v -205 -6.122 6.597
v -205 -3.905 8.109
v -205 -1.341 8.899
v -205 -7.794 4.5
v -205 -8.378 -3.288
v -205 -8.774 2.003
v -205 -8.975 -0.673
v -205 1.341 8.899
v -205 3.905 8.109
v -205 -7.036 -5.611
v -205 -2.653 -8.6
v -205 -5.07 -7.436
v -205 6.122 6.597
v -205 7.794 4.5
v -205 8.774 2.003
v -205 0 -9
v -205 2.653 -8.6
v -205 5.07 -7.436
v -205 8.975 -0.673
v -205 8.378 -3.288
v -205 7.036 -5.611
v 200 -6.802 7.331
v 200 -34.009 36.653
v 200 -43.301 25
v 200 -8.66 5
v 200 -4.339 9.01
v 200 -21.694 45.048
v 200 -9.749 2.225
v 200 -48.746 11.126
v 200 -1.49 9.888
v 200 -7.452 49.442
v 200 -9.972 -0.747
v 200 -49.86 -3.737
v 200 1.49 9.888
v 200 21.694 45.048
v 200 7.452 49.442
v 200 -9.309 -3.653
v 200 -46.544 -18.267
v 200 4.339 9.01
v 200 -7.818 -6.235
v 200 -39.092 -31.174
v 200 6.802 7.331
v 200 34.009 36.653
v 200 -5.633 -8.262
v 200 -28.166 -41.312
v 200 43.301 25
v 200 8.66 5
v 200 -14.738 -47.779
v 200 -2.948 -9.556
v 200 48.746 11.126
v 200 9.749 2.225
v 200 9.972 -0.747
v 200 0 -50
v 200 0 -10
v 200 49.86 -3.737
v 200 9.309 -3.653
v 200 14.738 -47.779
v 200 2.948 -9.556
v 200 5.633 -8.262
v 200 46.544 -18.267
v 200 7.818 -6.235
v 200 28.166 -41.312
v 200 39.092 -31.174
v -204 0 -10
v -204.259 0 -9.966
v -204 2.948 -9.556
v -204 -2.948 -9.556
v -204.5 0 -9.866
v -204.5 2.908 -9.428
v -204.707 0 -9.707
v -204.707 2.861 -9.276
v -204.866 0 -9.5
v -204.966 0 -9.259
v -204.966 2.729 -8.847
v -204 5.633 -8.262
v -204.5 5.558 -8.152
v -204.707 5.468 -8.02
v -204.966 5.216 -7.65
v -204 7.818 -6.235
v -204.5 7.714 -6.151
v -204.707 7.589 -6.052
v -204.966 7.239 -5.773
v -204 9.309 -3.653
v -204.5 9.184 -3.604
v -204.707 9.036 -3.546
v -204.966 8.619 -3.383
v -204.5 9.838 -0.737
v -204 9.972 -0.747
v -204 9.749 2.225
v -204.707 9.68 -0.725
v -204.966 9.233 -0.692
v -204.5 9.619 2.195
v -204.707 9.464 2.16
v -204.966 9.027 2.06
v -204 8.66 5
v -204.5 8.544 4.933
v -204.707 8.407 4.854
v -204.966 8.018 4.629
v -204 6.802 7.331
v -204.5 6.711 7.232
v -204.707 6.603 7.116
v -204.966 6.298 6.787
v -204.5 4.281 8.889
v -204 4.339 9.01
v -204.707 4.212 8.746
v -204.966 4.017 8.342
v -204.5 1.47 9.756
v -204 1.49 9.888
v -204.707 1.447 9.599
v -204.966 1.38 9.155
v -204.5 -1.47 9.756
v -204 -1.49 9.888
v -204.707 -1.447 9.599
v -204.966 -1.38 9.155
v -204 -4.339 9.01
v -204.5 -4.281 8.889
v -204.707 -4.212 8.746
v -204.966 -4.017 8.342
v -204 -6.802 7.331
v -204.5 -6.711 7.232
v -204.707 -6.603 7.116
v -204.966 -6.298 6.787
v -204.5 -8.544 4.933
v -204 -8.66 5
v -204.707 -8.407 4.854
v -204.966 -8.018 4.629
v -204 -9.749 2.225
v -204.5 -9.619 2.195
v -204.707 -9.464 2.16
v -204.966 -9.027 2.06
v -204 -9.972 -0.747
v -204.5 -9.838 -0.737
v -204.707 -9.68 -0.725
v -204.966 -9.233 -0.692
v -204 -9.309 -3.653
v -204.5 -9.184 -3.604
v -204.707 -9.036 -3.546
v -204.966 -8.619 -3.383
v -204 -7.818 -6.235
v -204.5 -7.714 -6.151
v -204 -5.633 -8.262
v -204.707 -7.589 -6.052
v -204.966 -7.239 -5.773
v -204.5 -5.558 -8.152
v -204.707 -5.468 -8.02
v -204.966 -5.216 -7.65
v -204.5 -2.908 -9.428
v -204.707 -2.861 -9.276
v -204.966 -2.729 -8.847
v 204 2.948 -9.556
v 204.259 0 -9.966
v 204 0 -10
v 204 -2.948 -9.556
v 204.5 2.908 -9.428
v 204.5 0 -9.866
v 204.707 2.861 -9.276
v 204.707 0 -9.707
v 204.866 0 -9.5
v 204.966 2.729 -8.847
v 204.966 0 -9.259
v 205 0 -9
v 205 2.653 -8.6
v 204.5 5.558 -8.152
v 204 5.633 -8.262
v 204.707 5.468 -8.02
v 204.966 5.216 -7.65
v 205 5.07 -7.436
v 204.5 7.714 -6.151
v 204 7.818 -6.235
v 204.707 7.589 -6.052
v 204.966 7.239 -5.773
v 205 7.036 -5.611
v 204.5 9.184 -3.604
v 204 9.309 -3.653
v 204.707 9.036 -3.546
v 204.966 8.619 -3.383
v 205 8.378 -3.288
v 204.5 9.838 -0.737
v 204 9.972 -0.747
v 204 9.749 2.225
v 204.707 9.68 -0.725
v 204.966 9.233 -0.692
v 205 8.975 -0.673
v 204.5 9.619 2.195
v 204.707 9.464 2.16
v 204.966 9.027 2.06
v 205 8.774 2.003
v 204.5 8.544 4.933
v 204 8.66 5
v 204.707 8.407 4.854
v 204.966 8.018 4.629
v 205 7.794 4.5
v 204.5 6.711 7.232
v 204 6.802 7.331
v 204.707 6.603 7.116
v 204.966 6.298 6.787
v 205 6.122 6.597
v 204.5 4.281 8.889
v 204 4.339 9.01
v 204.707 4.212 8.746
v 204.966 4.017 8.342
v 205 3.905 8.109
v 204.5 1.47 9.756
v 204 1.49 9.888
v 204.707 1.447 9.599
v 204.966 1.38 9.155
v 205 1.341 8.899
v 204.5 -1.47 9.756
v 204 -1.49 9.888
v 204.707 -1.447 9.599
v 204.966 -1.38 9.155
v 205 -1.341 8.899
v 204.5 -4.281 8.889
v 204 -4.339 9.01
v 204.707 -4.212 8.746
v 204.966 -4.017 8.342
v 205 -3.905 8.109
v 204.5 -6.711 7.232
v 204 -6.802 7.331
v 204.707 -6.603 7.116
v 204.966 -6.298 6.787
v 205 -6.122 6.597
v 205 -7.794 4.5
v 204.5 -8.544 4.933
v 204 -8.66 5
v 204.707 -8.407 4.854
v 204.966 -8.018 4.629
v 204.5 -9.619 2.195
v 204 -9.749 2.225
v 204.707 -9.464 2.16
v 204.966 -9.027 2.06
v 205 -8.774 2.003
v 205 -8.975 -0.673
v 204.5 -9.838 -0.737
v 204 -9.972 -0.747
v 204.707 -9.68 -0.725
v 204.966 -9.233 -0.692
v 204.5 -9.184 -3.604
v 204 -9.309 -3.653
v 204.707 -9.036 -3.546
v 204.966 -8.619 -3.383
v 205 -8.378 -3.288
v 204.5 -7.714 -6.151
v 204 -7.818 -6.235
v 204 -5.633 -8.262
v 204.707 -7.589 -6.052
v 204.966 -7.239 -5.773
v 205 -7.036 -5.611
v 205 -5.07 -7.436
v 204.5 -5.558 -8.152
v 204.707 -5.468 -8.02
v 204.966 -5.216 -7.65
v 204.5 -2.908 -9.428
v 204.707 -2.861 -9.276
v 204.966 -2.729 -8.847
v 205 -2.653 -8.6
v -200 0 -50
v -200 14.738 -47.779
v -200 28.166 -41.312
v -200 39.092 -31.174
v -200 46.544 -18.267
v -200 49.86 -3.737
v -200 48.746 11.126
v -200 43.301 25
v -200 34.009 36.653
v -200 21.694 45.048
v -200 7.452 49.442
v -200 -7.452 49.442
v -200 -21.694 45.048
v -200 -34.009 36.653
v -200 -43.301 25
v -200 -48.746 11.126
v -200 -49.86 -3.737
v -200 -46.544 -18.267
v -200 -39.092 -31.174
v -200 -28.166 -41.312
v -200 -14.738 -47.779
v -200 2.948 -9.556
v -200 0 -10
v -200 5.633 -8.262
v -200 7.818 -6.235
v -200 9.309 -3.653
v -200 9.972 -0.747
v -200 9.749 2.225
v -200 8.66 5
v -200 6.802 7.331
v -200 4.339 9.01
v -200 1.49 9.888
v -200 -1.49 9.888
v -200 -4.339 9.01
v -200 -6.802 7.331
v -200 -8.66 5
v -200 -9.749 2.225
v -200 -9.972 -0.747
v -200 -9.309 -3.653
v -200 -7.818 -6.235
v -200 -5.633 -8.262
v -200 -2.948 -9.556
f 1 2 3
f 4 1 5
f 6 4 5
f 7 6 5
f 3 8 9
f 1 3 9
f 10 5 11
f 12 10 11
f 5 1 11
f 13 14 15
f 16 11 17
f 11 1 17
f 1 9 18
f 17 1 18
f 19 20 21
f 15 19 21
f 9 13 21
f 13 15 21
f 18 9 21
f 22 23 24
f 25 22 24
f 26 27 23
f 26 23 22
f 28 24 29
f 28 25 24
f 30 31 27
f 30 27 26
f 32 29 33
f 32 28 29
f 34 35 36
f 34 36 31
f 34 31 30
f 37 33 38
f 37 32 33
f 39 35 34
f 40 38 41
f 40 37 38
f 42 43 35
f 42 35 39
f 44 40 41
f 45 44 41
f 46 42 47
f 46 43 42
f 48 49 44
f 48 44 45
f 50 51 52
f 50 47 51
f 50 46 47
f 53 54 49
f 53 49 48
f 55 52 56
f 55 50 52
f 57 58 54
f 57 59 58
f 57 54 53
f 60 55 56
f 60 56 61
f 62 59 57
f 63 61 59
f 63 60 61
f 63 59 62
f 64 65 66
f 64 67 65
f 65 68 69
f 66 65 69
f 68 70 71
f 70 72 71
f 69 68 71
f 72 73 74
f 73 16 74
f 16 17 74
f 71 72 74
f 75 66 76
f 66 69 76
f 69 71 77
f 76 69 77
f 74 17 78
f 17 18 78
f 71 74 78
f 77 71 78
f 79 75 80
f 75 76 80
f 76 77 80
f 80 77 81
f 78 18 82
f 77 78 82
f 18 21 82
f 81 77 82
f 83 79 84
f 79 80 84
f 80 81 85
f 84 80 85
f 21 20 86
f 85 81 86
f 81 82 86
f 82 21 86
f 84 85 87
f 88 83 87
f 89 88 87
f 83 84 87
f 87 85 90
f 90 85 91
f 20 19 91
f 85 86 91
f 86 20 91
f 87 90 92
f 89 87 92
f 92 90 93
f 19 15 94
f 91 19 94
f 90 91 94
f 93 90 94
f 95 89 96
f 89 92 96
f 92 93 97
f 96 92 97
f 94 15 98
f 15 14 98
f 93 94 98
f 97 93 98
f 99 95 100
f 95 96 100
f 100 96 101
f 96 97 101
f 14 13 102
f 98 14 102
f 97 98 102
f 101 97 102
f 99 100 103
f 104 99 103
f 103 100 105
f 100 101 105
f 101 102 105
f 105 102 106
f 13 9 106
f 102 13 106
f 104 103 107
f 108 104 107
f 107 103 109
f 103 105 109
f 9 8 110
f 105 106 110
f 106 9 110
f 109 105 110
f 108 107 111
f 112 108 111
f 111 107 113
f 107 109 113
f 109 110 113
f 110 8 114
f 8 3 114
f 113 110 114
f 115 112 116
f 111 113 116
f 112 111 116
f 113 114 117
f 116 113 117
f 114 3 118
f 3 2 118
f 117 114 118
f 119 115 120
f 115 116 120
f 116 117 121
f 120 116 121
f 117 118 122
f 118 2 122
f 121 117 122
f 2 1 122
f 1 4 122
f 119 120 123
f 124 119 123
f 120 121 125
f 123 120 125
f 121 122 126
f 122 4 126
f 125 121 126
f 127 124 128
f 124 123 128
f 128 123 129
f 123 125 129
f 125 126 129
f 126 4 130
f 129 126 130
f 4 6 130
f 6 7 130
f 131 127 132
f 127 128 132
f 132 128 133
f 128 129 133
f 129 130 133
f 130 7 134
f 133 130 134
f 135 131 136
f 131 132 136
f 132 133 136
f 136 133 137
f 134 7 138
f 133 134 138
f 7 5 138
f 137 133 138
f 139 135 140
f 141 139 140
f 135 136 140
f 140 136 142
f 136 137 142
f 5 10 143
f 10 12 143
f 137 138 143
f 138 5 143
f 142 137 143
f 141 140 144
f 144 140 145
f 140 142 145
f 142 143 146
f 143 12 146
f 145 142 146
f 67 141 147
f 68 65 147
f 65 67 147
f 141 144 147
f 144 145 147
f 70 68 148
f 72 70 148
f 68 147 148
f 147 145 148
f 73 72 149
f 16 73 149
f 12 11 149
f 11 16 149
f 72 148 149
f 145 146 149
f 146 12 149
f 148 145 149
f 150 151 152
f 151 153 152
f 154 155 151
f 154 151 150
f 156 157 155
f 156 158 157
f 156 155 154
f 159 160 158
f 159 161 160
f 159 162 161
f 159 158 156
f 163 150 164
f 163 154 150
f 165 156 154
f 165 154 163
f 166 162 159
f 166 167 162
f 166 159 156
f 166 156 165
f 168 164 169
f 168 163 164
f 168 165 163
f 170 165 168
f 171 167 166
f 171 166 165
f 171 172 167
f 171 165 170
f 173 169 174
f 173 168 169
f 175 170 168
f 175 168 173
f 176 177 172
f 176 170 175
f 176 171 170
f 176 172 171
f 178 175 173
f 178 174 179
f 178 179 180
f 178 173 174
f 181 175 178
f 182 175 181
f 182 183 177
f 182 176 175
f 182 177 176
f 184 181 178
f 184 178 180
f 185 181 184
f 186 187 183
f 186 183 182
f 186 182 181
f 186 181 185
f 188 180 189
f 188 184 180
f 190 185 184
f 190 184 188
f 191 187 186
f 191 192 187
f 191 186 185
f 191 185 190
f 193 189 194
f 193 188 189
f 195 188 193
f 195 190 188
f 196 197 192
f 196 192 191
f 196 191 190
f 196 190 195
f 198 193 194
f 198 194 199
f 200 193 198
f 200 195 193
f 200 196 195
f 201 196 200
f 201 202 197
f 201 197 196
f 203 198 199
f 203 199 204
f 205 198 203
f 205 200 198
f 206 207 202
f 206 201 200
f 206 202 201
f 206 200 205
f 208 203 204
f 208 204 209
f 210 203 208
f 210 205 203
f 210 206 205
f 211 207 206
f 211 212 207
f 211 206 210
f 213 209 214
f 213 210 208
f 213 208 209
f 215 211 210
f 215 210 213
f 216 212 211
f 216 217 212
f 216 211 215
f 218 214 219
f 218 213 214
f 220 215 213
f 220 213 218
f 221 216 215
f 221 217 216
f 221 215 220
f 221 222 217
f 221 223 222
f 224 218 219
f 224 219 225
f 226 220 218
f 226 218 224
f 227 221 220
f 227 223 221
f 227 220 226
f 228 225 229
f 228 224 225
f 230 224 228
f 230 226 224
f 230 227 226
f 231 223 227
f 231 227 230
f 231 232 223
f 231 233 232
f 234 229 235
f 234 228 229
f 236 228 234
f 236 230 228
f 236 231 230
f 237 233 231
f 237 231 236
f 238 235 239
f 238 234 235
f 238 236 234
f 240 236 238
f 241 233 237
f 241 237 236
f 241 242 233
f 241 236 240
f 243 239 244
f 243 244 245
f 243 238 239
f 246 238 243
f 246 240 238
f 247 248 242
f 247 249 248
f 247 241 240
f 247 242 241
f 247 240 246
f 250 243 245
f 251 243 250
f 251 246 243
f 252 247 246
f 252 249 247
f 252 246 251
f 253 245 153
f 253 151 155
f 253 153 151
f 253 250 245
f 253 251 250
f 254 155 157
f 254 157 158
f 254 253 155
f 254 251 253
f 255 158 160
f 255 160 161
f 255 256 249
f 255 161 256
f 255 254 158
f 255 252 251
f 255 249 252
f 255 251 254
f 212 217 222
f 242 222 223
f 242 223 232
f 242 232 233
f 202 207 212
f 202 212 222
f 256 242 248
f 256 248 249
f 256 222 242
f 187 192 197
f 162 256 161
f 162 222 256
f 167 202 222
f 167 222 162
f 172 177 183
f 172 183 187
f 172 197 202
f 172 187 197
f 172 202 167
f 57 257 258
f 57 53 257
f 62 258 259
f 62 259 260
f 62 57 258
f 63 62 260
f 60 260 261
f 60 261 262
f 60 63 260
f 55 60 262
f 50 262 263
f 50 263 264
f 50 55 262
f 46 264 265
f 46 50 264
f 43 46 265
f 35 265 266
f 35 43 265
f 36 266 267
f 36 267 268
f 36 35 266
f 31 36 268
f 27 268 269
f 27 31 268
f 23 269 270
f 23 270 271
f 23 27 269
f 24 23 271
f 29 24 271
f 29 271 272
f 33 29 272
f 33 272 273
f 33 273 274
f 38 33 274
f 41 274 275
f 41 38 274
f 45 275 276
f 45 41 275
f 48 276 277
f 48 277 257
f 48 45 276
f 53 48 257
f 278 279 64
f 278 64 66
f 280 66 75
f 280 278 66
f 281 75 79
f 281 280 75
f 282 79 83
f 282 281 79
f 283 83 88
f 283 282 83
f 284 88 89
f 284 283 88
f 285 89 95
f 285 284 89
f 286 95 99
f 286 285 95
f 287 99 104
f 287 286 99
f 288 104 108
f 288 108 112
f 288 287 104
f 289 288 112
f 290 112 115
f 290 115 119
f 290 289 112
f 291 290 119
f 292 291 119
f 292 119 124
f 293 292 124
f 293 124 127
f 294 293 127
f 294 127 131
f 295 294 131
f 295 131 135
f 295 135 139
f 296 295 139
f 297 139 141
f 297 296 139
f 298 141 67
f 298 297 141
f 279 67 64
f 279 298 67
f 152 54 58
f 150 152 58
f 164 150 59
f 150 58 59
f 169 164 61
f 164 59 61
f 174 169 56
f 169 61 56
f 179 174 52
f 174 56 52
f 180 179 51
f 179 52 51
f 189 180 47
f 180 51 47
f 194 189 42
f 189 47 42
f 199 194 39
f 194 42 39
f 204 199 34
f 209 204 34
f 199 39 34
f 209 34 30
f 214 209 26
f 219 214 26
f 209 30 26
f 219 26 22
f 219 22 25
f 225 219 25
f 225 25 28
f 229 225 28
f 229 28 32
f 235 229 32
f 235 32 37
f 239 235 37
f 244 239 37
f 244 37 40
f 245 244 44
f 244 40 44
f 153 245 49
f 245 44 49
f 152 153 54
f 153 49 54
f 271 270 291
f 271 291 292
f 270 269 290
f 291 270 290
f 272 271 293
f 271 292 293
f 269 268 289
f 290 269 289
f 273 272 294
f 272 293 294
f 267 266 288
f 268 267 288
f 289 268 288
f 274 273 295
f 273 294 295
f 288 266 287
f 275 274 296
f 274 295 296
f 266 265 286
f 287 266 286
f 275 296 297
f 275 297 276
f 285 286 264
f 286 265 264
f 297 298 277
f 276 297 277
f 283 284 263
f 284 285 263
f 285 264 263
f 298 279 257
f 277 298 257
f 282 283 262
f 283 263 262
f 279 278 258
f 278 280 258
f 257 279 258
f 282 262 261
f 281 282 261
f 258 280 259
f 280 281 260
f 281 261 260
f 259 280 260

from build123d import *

# Parameters (mm, degrees)
SKETCH1_R            = 50
BOSS_EXTRUDE1_DEPTH  = 200
SKETCH2_R            = 10
BOSS_EXTRUDE2_DEPTH  = 5
FILLET1_R            = 1
FILLET1_OF_MIRROR3_R = 1


with BuildPart() as part:
    # Sketch1 → Boss-Extrude1 (new, symmetric)
    with BuildSketch(Plane(origin=(0, 0, 0), x_dir=(0, 0, -1), z_dir=(1, 0, 0))):
        Circle(SKETCH1_R)
    extrude(amount=BOSS_EXTRUDE1_DEPTH, both=True)

    # Sketch2 → Boss-Extrude2 (add)
    with BuildSketch(Plane(origin=(200, 0, 0), x_dir=(0, 0, -1), z_dir=(1, 0, 0))):
        Circle(SKETCH2_R)
    boss_extrude2 = extrude(amount=BOSS_EXTRUDE2_DEPTH)

    # Fillet1
    fillet1_edges = [part.edges().sort_by_distance(p)[0] for p in [
        (205, 0, 10),
    ]]
    fillet(fillet1_edges, radius=FILLET1_R)

    # Mirror3: Boss-Extrude2 across plane
    add(boss_extrude2.mirror(Plane(origin=(0, 0, 0), x_dir=(0, 0, 1), z_dir=(1, 0, 0))))

    # Fillet1 of Mirror3
    fillet1_of_mirror3_edges = [part.edges().sort_by_distance(p)[0] for p in [
        (-205, 0, 10),
    ]]
    fillet(fillet1_of_mirror3_edges, radius=FILLET1_OF_MIRROR3_R)


solid = part.part
